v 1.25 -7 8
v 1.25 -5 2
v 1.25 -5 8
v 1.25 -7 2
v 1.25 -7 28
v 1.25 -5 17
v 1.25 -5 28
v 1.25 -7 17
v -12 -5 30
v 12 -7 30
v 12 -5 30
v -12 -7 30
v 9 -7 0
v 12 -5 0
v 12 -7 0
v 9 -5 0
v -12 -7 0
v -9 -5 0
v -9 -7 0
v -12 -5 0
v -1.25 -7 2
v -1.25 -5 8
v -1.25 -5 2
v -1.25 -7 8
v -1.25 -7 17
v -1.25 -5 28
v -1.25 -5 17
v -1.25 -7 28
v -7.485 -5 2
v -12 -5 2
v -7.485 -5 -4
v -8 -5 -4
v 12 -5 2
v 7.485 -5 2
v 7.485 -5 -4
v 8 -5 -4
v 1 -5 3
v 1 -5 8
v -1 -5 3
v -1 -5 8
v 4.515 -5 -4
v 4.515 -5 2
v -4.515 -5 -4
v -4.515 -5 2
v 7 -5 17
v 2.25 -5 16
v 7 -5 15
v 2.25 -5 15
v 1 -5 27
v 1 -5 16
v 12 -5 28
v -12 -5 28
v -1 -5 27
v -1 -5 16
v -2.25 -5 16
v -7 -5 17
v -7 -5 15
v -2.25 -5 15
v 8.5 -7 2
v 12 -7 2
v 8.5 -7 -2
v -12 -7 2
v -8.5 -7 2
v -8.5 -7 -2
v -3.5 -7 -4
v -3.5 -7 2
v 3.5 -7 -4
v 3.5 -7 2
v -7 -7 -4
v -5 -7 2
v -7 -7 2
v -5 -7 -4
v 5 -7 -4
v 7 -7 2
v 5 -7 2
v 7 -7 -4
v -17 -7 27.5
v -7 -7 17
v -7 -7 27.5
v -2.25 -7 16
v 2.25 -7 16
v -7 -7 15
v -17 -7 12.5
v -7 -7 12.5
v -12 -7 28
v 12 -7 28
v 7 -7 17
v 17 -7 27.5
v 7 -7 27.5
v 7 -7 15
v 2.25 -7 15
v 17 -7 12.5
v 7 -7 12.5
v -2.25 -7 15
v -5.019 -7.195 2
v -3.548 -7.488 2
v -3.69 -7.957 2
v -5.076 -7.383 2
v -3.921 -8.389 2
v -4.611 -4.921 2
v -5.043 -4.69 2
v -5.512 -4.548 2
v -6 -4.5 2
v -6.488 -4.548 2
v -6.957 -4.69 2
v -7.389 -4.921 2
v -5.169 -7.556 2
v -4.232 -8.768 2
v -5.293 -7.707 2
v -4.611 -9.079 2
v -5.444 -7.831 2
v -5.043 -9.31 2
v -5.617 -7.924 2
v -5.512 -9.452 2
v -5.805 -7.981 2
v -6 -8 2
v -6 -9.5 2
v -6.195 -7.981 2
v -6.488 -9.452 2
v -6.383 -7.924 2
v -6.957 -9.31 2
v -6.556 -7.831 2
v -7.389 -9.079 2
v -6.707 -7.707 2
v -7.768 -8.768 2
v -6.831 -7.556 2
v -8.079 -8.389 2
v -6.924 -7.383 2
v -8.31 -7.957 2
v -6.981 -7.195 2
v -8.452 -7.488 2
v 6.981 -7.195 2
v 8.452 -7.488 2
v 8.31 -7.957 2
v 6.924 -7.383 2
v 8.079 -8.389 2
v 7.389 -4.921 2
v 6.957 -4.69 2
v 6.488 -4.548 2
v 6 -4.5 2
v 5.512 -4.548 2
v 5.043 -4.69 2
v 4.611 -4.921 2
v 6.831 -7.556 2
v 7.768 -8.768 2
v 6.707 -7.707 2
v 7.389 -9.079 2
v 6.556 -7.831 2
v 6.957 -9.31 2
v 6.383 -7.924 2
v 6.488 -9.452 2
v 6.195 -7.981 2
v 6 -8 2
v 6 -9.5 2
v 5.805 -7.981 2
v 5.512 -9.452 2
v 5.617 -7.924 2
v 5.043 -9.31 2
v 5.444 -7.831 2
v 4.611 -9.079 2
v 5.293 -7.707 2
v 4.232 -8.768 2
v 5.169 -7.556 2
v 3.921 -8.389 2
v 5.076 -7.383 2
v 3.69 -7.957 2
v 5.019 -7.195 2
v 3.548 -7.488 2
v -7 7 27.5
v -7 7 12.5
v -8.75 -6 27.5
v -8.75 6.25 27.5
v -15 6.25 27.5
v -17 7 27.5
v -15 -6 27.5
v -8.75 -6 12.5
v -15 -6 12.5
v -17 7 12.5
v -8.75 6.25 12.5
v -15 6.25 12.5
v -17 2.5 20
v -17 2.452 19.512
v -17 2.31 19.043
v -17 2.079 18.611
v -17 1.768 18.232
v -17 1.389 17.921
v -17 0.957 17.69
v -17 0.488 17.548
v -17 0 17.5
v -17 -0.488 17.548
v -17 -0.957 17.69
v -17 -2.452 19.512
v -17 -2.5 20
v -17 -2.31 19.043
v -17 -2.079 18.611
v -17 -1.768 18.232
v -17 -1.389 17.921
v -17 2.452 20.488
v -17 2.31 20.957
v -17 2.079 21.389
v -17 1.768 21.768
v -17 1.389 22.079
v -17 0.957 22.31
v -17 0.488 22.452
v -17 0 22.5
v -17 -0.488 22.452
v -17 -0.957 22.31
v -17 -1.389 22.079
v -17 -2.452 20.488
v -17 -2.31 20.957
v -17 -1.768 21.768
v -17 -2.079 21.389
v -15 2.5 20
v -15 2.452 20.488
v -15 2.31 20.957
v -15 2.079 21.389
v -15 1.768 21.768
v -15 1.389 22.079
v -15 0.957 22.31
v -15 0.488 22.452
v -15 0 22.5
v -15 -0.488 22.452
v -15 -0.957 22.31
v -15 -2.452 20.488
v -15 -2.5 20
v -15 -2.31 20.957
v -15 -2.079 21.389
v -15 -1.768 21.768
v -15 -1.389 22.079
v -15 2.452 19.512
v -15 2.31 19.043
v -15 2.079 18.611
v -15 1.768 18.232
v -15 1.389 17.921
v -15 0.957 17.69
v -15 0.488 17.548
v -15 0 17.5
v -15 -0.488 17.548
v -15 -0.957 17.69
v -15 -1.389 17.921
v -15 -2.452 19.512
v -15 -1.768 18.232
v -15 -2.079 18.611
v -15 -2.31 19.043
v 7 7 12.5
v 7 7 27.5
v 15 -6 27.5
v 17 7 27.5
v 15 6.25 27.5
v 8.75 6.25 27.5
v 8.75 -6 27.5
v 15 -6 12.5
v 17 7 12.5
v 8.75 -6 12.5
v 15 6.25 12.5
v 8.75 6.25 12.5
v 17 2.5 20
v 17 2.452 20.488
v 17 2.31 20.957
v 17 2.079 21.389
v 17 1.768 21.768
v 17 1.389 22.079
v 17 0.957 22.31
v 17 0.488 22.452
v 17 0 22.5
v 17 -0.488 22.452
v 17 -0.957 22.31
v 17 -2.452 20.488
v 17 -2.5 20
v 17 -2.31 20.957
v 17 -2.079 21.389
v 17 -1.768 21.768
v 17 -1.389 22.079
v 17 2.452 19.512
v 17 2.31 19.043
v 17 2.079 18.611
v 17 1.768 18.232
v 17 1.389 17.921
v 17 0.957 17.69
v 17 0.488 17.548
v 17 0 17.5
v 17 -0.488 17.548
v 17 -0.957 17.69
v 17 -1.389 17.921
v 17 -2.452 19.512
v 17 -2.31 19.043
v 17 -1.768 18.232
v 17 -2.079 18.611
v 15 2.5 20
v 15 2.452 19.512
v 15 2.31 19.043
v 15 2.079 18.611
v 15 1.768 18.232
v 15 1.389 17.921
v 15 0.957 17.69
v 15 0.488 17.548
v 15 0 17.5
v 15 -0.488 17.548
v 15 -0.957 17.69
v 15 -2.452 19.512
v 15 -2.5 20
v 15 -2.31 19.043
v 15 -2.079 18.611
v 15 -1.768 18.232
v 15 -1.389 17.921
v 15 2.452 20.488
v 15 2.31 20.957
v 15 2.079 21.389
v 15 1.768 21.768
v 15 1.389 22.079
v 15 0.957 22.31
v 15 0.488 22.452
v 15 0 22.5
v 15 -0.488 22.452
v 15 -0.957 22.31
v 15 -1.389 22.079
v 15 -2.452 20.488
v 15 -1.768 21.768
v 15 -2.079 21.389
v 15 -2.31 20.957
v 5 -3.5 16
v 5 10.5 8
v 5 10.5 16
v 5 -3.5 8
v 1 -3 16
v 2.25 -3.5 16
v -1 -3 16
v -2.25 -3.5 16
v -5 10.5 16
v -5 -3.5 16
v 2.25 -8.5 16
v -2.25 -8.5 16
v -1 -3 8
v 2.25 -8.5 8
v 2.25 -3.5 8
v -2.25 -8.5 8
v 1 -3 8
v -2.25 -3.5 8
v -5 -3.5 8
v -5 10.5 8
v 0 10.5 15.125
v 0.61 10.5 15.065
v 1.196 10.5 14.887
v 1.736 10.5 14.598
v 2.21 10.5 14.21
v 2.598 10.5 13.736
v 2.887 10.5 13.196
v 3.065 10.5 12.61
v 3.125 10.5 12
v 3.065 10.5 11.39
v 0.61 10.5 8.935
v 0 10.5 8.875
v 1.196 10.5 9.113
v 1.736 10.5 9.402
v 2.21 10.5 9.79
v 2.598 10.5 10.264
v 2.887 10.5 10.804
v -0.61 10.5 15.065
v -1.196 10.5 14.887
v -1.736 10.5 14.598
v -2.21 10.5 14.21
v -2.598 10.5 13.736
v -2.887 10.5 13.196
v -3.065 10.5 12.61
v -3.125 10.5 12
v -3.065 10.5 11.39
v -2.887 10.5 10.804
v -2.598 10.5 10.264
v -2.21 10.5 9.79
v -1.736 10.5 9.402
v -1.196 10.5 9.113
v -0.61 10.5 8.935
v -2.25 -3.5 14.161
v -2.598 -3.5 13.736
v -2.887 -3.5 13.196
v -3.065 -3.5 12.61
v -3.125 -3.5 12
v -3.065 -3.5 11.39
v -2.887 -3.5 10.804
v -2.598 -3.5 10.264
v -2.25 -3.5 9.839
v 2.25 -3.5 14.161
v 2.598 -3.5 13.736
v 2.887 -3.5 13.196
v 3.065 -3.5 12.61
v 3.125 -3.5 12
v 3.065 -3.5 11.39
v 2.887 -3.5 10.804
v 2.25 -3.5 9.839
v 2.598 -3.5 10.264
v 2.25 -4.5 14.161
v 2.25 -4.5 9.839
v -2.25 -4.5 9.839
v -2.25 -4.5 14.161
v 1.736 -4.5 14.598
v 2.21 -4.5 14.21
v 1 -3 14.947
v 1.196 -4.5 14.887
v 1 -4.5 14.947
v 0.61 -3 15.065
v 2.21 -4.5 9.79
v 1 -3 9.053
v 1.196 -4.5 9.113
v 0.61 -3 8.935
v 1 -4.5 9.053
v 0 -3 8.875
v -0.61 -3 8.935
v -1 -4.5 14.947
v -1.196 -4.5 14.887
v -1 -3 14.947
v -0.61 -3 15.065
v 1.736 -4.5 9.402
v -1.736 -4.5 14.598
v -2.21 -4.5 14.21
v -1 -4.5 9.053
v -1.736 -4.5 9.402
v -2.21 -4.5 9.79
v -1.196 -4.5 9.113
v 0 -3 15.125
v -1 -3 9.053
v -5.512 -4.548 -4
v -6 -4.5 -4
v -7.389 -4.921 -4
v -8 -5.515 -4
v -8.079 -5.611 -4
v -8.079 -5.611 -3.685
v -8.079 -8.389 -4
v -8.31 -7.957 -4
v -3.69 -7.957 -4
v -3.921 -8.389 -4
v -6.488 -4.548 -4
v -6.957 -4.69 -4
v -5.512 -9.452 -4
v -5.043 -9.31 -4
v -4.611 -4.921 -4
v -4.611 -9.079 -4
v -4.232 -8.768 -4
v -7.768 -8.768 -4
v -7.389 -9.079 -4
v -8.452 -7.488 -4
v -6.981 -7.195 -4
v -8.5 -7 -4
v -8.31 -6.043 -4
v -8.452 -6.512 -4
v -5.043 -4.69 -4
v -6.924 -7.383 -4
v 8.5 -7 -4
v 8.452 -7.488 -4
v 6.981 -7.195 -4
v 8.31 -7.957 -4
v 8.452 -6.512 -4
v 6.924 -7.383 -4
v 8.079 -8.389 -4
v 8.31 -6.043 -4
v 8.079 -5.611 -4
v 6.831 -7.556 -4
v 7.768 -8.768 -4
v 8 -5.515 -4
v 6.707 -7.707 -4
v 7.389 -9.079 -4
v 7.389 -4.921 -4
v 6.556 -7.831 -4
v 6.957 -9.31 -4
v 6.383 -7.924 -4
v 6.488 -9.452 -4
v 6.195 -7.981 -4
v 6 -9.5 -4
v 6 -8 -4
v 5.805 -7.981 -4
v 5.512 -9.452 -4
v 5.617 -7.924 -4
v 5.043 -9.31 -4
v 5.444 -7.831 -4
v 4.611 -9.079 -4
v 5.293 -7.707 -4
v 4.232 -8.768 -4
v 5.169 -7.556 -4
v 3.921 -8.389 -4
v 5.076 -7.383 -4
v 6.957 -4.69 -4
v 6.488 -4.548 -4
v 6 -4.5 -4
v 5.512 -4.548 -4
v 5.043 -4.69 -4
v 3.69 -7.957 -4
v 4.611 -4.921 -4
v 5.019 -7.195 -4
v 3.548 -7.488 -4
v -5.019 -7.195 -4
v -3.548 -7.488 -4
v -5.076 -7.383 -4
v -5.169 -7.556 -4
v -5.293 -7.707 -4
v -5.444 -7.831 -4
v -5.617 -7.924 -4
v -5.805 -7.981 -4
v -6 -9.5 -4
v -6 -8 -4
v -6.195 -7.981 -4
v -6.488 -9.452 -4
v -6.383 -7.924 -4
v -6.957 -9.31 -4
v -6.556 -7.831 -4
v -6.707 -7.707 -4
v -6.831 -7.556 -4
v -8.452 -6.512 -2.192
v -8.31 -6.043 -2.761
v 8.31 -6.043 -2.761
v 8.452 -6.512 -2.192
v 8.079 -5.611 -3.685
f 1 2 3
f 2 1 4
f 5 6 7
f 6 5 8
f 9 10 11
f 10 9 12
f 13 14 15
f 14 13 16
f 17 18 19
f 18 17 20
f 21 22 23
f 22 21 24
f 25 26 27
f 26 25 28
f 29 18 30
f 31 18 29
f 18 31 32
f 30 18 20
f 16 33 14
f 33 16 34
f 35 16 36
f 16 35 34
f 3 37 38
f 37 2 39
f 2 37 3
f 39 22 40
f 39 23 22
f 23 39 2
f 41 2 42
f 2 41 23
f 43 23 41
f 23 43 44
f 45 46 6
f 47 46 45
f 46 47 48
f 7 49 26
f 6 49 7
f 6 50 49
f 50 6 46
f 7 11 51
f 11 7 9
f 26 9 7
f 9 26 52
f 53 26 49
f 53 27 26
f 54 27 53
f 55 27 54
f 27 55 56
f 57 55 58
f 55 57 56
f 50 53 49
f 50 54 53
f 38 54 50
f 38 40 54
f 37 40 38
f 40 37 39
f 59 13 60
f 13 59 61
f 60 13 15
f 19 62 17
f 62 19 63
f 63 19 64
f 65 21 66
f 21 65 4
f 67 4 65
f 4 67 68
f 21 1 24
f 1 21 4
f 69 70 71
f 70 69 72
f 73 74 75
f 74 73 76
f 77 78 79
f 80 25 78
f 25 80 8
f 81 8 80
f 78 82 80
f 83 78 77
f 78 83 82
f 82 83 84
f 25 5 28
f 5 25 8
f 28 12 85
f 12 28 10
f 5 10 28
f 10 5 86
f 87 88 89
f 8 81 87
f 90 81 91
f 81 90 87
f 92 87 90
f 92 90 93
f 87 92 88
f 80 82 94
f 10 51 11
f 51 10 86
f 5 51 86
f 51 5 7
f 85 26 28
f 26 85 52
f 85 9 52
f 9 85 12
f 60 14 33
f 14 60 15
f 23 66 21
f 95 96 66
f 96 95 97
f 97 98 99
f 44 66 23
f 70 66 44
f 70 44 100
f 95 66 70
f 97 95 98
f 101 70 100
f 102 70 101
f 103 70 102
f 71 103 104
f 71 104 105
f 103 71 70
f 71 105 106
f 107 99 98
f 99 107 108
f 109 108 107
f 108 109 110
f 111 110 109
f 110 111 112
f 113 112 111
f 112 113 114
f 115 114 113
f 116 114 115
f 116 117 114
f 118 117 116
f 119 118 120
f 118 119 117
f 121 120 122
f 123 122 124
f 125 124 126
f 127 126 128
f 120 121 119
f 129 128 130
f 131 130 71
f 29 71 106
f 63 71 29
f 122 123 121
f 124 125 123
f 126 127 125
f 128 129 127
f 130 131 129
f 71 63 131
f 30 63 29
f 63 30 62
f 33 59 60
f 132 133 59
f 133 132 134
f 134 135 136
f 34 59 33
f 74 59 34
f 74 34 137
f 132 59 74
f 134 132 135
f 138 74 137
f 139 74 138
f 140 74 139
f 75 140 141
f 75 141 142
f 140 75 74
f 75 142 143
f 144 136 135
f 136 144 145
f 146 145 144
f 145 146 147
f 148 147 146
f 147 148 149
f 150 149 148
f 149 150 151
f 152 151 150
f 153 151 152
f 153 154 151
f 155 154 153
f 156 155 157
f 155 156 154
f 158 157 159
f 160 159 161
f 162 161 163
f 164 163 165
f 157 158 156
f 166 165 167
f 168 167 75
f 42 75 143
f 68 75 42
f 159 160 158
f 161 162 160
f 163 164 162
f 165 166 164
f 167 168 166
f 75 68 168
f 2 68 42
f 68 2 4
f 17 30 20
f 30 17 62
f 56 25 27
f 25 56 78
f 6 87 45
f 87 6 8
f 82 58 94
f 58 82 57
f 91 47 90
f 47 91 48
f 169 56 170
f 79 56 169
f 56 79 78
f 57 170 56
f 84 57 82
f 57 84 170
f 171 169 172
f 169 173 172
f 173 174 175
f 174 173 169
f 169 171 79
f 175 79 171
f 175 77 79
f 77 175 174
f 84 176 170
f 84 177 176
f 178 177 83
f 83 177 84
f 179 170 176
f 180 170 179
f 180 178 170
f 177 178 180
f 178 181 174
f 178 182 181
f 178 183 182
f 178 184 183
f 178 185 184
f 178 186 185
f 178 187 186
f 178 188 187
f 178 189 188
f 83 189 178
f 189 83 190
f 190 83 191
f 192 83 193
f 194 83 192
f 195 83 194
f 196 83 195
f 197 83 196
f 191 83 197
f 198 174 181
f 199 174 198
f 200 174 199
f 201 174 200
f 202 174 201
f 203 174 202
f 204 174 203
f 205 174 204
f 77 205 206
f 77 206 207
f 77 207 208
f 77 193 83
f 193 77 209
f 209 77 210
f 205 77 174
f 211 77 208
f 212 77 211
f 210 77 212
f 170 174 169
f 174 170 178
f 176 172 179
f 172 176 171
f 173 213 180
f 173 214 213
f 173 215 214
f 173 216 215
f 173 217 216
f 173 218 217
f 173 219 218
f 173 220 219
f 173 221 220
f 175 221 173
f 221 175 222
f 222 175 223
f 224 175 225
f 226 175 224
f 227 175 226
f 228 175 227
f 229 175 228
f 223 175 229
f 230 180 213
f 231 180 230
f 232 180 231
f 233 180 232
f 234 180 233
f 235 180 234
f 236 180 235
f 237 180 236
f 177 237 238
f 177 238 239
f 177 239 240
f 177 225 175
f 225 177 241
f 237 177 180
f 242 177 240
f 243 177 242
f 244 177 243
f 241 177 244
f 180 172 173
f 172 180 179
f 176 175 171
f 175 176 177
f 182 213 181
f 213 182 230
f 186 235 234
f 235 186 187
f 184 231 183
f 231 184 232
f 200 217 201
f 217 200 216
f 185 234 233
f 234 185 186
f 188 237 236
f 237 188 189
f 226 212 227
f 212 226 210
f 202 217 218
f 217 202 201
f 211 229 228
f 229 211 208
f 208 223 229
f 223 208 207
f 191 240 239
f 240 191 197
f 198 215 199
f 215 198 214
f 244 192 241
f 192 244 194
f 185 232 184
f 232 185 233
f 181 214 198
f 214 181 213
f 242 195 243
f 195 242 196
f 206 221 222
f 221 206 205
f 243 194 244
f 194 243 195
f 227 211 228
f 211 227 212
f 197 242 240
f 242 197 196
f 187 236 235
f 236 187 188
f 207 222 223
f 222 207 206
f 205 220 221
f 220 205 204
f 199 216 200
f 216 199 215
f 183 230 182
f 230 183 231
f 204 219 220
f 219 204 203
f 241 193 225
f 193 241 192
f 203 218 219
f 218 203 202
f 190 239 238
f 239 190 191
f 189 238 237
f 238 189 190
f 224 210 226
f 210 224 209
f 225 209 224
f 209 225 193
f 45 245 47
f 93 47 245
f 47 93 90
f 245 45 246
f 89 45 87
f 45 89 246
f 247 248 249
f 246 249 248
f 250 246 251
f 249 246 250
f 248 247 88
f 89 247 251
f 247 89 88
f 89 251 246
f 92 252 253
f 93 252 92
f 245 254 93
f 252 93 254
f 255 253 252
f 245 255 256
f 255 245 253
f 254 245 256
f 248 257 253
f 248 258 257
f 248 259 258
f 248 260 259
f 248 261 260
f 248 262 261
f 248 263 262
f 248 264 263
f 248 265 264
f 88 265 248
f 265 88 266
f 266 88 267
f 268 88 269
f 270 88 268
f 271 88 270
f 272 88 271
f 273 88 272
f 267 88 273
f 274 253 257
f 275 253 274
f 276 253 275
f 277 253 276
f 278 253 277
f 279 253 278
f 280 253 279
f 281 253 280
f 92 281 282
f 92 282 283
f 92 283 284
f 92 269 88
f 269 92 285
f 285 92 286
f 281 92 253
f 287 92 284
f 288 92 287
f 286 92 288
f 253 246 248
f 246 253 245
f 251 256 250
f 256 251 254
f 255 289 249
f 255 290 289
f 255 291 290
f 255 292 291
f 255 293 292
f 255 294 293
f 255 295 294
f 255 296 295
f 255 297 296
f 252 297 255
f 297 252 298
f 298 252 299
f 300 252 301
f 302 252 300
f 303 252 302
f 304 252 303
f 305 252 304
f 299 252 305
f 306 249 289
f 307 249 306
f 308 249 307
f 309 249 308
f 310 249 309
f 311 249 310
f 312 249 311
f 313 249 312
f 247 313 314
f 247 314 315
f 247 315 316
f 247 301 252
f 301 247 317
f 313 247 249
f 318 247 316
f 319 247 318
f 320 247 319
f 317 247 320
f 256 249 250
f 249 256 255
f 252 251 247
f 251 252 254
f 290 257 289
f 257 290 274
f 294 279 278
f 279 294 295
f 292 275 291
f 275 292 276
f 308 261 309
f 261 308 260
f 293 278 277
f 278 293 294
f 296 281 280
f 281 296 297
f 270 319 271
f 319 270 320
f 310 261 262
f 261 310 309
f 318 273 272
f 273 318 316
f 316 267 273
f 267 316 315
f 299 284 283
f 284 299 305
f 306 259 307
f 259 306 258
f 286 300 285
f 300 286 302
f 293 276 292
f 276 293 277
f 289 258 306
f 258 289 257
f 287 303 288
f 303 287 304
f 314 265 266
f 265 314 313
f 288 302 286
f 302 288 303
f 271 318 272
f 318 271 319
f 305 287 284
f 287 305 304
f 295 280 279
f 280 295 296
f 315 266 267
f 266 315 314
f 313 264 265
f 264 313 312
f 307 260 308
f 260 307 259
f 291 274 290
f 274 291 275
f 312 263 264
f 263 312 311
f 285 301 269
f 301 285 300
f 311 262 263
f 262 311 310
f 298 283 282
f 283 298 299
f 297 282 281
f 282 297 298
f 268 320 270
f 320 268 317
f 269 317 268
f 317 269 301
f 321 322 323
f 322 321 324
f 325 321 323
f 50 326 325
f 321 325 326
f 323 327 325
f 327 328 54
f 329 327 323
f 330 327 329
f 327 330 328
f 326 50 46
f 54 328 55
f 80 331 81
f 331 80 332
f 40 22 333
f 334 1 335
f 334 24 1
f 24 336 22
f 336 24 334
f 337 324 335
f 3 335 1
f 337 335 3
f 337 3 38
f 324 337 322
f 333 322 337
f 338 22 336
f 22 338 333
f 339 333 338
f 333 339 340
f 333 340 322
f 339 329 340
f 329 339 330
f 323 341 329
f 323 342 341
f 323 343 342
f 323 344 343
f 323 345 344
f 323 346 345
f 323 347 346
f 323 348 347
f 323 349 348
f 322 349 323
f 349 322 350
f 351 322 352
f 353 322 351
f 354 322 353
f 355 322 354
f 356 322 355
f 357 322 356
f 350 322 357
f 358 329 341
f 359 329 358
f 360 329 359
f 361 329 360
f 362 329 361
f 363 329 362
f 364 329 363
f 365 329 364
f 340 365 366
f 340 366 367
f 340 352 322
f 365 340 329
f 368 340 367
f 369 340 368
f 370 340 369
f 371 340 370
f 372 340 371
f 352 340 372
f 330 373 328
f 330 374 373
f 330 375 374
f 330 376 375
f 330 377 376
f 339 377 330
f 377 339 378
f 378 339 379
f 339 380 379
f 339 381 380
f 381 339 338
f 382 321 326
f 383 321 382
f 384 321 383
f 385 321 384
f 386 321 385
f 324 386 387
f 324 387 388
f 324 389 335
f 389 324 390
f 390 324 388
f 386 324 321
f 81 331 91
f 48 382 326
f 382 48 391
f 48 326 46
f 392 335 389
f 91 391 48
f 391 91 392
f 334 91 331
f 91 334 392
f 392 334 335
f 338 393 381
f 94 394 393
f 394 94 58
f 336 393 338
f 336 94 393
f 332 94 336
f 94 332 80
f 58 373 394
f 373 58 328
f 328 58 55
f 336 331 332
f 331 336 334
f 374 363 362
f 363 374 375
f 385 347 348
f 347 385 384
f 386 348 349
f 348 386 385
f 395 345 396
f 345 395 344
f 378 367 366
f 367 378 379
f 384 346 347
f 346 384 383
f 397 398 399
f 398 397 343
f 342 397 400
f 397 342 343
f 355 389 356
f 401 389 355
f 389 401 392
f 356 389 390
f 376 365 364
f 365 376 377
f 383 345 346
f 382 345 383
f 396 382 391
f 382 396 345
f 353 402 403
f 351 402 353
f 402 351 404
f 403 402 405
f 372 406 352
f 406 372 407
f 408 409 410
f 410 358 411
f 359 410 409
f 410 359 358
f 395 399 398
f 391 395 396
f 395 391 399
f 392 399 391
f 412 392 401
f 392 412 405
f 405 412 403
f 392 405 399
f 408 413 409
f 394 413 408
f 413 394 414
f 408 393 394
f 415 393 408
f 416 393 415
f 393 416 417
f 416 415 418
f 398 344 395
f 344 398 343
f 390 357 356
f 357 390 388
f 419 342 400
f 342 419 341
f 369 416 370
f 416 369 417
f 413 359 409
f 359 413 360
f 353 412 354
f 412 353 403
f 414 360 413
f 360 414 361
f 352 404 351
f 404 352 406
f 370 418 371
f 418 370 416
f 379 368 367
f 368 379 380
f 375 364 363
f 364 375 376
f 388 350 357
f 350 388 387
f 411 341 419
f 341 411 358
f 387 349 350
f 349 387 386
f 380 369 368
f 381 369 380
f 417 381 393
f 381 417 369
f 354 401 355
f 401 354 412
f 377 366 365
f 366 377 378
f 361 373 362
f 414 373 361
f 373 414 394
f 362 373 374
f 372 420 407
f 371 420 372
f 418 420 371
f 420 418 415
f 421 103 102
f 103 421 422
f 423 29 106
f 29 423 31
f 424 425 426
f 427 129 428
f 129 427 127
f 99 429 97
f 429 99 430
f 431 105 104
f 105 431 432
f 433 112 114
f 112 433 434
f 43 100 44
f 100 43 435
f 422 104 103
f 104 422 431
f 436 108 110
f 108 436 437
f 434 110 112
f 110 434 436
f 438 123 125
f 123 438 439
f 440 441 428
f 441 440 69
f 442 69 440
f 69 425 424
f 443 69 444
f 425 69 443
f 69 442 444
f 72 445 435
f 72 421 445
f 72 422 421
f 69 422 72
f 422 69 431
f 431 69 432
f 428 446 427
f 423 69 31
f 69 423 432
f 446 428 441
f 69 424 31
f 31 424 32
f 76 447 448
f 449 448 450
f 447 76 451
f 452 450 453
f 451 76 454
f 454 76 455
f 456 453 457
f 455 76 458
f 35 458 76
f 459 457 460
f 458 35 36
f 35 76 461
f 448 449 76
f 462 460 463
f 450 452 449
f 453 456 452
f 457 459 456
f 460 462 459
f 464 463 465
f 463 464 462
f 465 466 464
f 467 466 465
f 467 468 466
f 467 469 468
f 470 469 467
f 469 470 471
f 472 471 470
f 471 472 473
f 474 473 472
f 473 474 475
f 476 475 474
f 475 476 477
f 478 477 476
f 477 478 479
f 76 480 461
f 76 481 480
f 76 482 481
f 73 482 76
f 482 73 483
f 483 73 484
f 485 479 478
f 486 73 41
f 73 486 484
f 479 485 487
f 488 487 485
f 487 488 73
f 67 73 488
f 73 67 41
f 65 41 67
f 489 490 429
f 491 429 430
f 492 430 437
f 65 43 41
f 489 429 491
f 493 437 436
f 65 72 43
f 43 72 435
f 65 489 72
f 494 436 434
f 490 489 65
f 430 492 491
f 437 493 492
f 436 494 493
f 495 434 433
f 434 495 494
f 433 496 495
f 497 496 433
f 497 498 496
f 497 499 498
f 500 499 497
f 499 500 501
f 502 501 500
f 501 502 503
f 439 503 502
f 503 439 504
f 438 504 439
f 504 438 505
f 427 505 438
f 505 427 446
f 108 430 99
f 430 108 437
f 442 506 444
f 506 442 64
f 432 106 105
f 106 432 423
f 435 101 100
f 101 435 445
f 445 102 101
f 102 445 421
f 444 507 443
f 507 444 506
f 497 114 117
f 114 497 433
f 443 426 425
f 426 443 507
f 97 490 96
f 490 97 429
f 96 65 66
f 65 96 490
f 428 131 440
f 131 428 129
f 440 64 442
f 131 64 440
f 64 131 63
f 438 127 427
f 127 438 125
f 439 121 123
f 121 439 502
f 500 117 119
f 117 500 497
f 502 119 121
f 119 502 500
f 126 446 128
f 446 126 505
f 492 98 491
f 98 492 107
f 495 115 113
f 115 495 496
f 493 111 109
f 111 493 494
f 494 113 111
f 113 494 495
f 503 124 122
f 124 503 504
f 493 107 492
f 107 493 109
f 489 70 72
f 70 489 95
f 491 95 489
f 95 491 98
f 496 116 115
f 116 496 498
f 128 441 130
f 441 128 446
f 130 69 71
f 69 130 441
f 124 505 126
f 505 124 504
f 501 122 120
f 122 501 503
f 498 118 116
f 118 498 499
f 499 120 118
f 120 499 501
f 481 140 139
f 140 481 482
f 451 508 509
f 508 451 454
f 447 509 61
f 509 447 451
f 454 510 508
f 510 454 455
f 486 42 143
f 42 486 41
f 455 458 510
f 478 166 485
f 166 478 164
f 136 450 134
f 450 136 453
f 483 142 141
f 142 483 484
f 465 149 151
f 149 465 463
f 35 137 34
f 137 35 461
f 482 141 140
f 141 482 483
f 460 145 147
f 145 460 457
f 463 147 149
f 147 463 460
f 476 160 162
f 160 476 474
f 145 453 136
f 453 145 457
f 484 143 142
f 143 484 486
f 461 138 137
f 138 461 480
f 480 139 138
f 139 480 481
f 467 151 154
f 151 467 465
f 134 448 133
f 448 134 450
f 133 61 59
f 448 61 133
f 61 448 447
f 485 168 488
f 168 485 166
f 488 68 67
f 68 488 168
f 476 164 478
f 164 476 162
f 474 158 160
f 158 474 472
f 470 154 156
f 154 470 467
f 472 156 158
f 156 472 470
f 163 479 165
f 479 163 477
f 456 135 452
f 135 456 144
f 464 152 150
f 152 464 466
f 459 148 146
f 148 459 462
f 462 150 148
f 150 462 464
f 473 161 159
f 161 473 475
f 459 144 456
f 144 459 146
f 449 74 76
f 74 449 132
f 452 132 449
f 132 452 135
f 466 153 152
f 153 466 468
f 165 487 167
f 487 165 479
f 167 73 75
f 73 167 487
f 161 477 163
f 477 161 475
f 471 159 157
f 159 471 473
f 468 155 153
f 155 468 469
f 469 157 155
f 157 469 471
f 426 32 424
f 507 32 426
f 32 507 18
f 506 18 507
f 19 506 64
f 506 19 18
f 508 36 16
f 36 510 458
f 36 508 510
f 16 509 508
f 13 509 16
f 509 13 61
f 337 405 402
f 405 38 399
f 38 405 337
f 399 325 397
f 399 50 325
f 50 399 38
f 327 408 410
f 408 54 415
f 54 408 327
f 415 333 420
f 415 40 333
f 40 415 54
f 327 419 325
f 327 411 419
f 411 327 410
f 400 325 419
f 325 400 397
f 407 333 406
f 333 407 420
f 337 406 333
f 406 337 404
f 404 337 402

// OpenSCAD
// file: config_10cm.scad
// ============================================
// NuiBone - 10cm版 共通設定ファイル
// ============================================
// 10cmぬいぐるみ用ロボット骨格の寸法設定
// ※サーボはSG90では大きすぎるため、
//   より小型のサーボを推奨
// ============================================

// --- ぬいぐるみサイズ制約 ---
nui_height = 100;        // ぬいぐるみ全高 (mm)
nui_body_width = 28;     // 胴体最大幅 (mm)
nui_body_depth = 18;     // 胴体最大厚み (mm)

// --- 骨格寸法 ---
bone_thickness = 2.0;    // 骨格基本厚み (mm)
bone_width = 2.5;        // 骨格基本幅 (mm)

// 胴体フレーム
body_height = 30;        // 胴体高さ (mm)
body_width = 24;         // 胴体幅 (mm)
body_depth = 14;         // 胴体奥行き (mm)

// 肩
shoulder_width = 6;      // 肩部品幅 (mm)
shoulder_offset = 10;    // 肩の高さ位置（胴体上端から）

// 腕
arm_length = 22;         // 腕の長さ (mm)
arm_width = 3;           // 腕の幅 (mm)
arm_thickness = 1.5;     // 腕の厚み (mm)

// 足
foot_width = 8;          // 足幅 (mm)
foot_length = 10;        // 足長さ (mm)
foot_height = 4;         // 足高さ (mm)
leg_length = 20;         // 脚の長さ (mm)

// --- サーボ選択 ---
// 10cm版では以下のいずれかを推奨:
// 1. SG51R (5g) - 最小クラス
// 2. HK-5320 (3.7g) - 超小型
// 3. 自作リニアアクチュエータ

// SG51R寸法 (参考)
servo_width = 6.0;       // サーボ幅 (mm)
servo_height = 15.0;     // サーボ高さ (mm)
servo_depth = 12.0;      // サーボ奥行き (mm)
servo_shaft_height = 3;  // 出力軸高さ (mm)
servo_shaft_dia = 3.0;   // 出力軸直径 (mm)

// --- 代替案: 振動モーター版 ---
// サーボの代わりに偏心モーターで「ぷるぷる」動作
vibration_motor_dia = 6; // 振動モーター直径 (mm)
vibration_motor_len = 12;// 振動モーター長さ (mm)

// --- 磁石・重り（10cm版用）---
magnet_dia = 3;          // ネオジム磁石直径 (mm) - より小さい
magnet_height = 1.5;     // ネオジム磁石高さ (mm)
weight_hole_dia = 4;     // 重り穴直径 (mm)

// --- 呼吸機構（10cm版）---
breath_stroke = 2;       // 呼吸ストローク (mm)
breath_plate_size = 10;  // 呼吸プレートサイズ (mm)

// --- 印刷設定 ---
wall_thick = 0.8;        // 壁厚み (mm) - より薄く
tolerance = 0.25;        // 組み立て公差 (mm)
$fn = 32;                // 円の分割数

// --- 色設定（プレビュー用）---
color_bone = [0.9, 0.9, 0.85];
color_servo = [0.2, 0.2, 0.3];
color_magnet = [0.7, 0.7, 0.7];

// ============================================
// 10cm版の制約と推奨事項
// ============================================
//
// 【課題】
// - SG90 (12.2mm幅) は10cmぬいぐるみには大きすぎる
// - 電池も単3では大きい
//
// 【推奨構成】
// 1. マイクロサーボ版
//    - サーボ: SG51R または HK-5320
//    - 電源: LiPo 1S (3.7V) 100-200mAh
//    - 制御: ESP32-C3 または Seeed XIAO
//
// 2. 振動モーター版（簡易版）
//    - 振動モーター × 2-3個
//    - 「ぷるぷる」動作で生命感を表現
//    - サーボ制御不要で省スペース
//
// 3. SMA (形状記憶合金) 版
//    - 超薄型で柔軟
//    - ゆっくりした動きに最適
//    - 呼吸表現に理想的
// ============================================
// main file
// ============================================
// NuiBone - 10cm版 胴体フレーム
// ============================================
// 10cmぬいぐるみ用のコンパクトな骨格
// マイクロサーボまたは振動モーター対応
// ============================================

include <config_10cm.scad>

// --- 胴体フレーム本体 ---
module body_frame_10cm() {
    difference() {
        union() {
            // メインフレーム（背骨）
            main_spine_10cm();

            // 肩マウント部（マイクロサーボ用）
            translate([0, 0, body_height - shoulder_offset])
                shoulder_mounts_10cm();

            // 呼吸機構マウント
            translate([0, 0, body_height/2 - 3])
                breathing_mount_10cm();

            // 腰部（足接続部）
            hip_section_10cm();
        }

        // 配線穴
        wiring_channels_10cm();
    }
}

// --- メインスパイン（背骨）10cm版 ---
module main_spine_10cm() {
    // 中央の背骨
    translate([-bone_width/2, -body_depth/2, 0])
        cube([bone_width, bone_thickness, body_height]);

    // 上部横バー
    translate([-body_width/2, -body_depth/2, body_height - bone_thickness])
        cube([body_width, bone_thickness, bone_thickness]);

    // 下部横バー
    translate([-body_width/2, -body_depth/2, 0])
        cube([body_width, bone_thickness, bone_thickness]);

    // リブ（補強）
    translate([-body_width/3, -body_depth/2, body_height/2])
        cube([body_width*2/3, bone_thickness, bone_thickness]);
}

// --- 肩マウント（マイクロサーボ用）---
module shoulder_mounts_10cm() {
    // 左肩
    translate([-body_width/2, 0, 0])
        micro_servo_mount();

    // 右肩
    translate([body_width/2, 0, 0])
        mirror([1, 0, 0])
            micro_servo_mount();
}

// --- マイクロサーボマウント ---
module micro_servo_mount() {
    difference() {
        // マウントベース
        translate([-servo_width/2 - 2, -servo_depth/2 - 1, -servo_height/2])
            cube([servo_width + 4, servo_depth + 2, servo_height]);

        // サーボ本体穴
        translate([-servo_width/2, -servo_depth/2, -servo_height/2 - 1])
            cube([servo_width + tolerance, servo_depth + tolerance, servo_height + 2]);

        // 出力軸穴
        translate([-servo_width/2 - 5, 0, 0])
            rotate([0, 90, 0])
                cylinder(h=10, d=servo_shaft_dia + 2);

        // 配線穴
        translate([servo_width/2 - 2, 0, -servo_height/2 - 2])
            cylinder(h=servo_height + 4, d=3);
    }
}

// --- 呼吸機構マウント（10cm版）---
module breathing_mount_10cm() {
    // 振動モーターまたはSMAワイヤー用のシンプルなマウント
    translate([0, body_depth/4, 0]) {
        difference() {
            union() {
                // マウントベース
                cube([vibration_motor_dia + 4, vibration_motor_len + 2, 8], center=true);

                // 背骨への接続
                translate([0, -vibration_motor_len/2 - 3, 0])
                    cube([bone_width + 2, 6, 8], center=true);
            }

            // モーター穴
            rotate([90, 0, 0])
                cylinder(h=vibration_motor_len + 4, d=vibration_motor_dia + tolerance, center=true);
        }
    }
}

// --- 腰部（10cm版）---
module hip_section_10cm() {
    // 腰ベース
    hull() {
        translate([-body_width/2 + 3, -body_depth/2, 0])
            cube([body_width - 6, bone_thickness, bone_thickness]);

        translate([-body_width/3, -body_depth/2, -4])
            cube([body_width*2/3, bone_thickness, bone_thickness]);
    }

    // 足接続ポイント
    for (x = [-body_width/4, body_width/4]) {
        translate([x, -body_depth/2, -4]) {
            difference() {
                cylinder(h=6, d=5);
                translate([0, 0, -1])
                    cylinder(h=8, d=2);  // 接続穴
            }
        }
    }
}

// --- 配線チャンネル ---
module wiring_channels_10cm() {
    // 背骨に沿った配線溝
    translate([-1, -body_depth/2 + bone_thickness, 3])
        cube([2, 2, body_height - 6]);
}

// --- ESP32マウント用穴（外付け）---
module esp32_mount_holes_10cm() {
    // 背面にXIAOまたはESP32-C3を外付け
    translate([0, -body_depth/2 - 5, body_height/2]) {
        for (pos = [[-8, 0, -8], [8, 0, -8], [-8, 0, 8], [8, 0, 8]]) {
            translate(pos)
                rotate([90, 0, 0])
                    cylinder(h=6, d=1.5, center=true);
        }
    }
}

// --- 振動モーター版フレーム ---
// サーボなしの簡易版
module body_frame_10cm_vibration() {
    difference() {
        union() {
            main_spine_10cm();

            // 振動モーターマウント（胸部）
            translate([0, body_depth/4, body_height - 12])
                vibration_motor_holder();

            // 振動モーターマウント（左腕）
            translate([-body_width/2, 0, body_height - shoulder_offset])
                rotate([0, -90, 0])
                    vibration_motor_holder();

            // 振動モーターマウント（右腕）
            translate([body_width/2, 0, body_height - shoulder_offset])
                rotate([0, 90, 0])
                    vibration_motor_holder();

            hip_section_10cm();
        }

        wiring_channels_10cm();
    }
}

// --- 振動モーターホルダー ---
module vibration_motor_holder() {
    difference() {
        cylinder(h=vibration_motor_len + 2, d=vibration_motor_dia + 3);
        translate([0, 0, -1])
            cylinder(h=vibration_motor_len + 4, d=vibration_motor_dia + tolerance);
        // スリット（挿入用）
        translate([0, vibration_motor_dia/2 + 1, vibration_motor_len/2])
            cube([1.5, 3, vibration_motor_len + 4], center=true);
    }
}

// --- メイン出力 ---
body_frame_10cm();

// 振動モーター版（コメントアウトで切替）
// translate([50, 0, 0]) body_frame_10cm_vibration();
